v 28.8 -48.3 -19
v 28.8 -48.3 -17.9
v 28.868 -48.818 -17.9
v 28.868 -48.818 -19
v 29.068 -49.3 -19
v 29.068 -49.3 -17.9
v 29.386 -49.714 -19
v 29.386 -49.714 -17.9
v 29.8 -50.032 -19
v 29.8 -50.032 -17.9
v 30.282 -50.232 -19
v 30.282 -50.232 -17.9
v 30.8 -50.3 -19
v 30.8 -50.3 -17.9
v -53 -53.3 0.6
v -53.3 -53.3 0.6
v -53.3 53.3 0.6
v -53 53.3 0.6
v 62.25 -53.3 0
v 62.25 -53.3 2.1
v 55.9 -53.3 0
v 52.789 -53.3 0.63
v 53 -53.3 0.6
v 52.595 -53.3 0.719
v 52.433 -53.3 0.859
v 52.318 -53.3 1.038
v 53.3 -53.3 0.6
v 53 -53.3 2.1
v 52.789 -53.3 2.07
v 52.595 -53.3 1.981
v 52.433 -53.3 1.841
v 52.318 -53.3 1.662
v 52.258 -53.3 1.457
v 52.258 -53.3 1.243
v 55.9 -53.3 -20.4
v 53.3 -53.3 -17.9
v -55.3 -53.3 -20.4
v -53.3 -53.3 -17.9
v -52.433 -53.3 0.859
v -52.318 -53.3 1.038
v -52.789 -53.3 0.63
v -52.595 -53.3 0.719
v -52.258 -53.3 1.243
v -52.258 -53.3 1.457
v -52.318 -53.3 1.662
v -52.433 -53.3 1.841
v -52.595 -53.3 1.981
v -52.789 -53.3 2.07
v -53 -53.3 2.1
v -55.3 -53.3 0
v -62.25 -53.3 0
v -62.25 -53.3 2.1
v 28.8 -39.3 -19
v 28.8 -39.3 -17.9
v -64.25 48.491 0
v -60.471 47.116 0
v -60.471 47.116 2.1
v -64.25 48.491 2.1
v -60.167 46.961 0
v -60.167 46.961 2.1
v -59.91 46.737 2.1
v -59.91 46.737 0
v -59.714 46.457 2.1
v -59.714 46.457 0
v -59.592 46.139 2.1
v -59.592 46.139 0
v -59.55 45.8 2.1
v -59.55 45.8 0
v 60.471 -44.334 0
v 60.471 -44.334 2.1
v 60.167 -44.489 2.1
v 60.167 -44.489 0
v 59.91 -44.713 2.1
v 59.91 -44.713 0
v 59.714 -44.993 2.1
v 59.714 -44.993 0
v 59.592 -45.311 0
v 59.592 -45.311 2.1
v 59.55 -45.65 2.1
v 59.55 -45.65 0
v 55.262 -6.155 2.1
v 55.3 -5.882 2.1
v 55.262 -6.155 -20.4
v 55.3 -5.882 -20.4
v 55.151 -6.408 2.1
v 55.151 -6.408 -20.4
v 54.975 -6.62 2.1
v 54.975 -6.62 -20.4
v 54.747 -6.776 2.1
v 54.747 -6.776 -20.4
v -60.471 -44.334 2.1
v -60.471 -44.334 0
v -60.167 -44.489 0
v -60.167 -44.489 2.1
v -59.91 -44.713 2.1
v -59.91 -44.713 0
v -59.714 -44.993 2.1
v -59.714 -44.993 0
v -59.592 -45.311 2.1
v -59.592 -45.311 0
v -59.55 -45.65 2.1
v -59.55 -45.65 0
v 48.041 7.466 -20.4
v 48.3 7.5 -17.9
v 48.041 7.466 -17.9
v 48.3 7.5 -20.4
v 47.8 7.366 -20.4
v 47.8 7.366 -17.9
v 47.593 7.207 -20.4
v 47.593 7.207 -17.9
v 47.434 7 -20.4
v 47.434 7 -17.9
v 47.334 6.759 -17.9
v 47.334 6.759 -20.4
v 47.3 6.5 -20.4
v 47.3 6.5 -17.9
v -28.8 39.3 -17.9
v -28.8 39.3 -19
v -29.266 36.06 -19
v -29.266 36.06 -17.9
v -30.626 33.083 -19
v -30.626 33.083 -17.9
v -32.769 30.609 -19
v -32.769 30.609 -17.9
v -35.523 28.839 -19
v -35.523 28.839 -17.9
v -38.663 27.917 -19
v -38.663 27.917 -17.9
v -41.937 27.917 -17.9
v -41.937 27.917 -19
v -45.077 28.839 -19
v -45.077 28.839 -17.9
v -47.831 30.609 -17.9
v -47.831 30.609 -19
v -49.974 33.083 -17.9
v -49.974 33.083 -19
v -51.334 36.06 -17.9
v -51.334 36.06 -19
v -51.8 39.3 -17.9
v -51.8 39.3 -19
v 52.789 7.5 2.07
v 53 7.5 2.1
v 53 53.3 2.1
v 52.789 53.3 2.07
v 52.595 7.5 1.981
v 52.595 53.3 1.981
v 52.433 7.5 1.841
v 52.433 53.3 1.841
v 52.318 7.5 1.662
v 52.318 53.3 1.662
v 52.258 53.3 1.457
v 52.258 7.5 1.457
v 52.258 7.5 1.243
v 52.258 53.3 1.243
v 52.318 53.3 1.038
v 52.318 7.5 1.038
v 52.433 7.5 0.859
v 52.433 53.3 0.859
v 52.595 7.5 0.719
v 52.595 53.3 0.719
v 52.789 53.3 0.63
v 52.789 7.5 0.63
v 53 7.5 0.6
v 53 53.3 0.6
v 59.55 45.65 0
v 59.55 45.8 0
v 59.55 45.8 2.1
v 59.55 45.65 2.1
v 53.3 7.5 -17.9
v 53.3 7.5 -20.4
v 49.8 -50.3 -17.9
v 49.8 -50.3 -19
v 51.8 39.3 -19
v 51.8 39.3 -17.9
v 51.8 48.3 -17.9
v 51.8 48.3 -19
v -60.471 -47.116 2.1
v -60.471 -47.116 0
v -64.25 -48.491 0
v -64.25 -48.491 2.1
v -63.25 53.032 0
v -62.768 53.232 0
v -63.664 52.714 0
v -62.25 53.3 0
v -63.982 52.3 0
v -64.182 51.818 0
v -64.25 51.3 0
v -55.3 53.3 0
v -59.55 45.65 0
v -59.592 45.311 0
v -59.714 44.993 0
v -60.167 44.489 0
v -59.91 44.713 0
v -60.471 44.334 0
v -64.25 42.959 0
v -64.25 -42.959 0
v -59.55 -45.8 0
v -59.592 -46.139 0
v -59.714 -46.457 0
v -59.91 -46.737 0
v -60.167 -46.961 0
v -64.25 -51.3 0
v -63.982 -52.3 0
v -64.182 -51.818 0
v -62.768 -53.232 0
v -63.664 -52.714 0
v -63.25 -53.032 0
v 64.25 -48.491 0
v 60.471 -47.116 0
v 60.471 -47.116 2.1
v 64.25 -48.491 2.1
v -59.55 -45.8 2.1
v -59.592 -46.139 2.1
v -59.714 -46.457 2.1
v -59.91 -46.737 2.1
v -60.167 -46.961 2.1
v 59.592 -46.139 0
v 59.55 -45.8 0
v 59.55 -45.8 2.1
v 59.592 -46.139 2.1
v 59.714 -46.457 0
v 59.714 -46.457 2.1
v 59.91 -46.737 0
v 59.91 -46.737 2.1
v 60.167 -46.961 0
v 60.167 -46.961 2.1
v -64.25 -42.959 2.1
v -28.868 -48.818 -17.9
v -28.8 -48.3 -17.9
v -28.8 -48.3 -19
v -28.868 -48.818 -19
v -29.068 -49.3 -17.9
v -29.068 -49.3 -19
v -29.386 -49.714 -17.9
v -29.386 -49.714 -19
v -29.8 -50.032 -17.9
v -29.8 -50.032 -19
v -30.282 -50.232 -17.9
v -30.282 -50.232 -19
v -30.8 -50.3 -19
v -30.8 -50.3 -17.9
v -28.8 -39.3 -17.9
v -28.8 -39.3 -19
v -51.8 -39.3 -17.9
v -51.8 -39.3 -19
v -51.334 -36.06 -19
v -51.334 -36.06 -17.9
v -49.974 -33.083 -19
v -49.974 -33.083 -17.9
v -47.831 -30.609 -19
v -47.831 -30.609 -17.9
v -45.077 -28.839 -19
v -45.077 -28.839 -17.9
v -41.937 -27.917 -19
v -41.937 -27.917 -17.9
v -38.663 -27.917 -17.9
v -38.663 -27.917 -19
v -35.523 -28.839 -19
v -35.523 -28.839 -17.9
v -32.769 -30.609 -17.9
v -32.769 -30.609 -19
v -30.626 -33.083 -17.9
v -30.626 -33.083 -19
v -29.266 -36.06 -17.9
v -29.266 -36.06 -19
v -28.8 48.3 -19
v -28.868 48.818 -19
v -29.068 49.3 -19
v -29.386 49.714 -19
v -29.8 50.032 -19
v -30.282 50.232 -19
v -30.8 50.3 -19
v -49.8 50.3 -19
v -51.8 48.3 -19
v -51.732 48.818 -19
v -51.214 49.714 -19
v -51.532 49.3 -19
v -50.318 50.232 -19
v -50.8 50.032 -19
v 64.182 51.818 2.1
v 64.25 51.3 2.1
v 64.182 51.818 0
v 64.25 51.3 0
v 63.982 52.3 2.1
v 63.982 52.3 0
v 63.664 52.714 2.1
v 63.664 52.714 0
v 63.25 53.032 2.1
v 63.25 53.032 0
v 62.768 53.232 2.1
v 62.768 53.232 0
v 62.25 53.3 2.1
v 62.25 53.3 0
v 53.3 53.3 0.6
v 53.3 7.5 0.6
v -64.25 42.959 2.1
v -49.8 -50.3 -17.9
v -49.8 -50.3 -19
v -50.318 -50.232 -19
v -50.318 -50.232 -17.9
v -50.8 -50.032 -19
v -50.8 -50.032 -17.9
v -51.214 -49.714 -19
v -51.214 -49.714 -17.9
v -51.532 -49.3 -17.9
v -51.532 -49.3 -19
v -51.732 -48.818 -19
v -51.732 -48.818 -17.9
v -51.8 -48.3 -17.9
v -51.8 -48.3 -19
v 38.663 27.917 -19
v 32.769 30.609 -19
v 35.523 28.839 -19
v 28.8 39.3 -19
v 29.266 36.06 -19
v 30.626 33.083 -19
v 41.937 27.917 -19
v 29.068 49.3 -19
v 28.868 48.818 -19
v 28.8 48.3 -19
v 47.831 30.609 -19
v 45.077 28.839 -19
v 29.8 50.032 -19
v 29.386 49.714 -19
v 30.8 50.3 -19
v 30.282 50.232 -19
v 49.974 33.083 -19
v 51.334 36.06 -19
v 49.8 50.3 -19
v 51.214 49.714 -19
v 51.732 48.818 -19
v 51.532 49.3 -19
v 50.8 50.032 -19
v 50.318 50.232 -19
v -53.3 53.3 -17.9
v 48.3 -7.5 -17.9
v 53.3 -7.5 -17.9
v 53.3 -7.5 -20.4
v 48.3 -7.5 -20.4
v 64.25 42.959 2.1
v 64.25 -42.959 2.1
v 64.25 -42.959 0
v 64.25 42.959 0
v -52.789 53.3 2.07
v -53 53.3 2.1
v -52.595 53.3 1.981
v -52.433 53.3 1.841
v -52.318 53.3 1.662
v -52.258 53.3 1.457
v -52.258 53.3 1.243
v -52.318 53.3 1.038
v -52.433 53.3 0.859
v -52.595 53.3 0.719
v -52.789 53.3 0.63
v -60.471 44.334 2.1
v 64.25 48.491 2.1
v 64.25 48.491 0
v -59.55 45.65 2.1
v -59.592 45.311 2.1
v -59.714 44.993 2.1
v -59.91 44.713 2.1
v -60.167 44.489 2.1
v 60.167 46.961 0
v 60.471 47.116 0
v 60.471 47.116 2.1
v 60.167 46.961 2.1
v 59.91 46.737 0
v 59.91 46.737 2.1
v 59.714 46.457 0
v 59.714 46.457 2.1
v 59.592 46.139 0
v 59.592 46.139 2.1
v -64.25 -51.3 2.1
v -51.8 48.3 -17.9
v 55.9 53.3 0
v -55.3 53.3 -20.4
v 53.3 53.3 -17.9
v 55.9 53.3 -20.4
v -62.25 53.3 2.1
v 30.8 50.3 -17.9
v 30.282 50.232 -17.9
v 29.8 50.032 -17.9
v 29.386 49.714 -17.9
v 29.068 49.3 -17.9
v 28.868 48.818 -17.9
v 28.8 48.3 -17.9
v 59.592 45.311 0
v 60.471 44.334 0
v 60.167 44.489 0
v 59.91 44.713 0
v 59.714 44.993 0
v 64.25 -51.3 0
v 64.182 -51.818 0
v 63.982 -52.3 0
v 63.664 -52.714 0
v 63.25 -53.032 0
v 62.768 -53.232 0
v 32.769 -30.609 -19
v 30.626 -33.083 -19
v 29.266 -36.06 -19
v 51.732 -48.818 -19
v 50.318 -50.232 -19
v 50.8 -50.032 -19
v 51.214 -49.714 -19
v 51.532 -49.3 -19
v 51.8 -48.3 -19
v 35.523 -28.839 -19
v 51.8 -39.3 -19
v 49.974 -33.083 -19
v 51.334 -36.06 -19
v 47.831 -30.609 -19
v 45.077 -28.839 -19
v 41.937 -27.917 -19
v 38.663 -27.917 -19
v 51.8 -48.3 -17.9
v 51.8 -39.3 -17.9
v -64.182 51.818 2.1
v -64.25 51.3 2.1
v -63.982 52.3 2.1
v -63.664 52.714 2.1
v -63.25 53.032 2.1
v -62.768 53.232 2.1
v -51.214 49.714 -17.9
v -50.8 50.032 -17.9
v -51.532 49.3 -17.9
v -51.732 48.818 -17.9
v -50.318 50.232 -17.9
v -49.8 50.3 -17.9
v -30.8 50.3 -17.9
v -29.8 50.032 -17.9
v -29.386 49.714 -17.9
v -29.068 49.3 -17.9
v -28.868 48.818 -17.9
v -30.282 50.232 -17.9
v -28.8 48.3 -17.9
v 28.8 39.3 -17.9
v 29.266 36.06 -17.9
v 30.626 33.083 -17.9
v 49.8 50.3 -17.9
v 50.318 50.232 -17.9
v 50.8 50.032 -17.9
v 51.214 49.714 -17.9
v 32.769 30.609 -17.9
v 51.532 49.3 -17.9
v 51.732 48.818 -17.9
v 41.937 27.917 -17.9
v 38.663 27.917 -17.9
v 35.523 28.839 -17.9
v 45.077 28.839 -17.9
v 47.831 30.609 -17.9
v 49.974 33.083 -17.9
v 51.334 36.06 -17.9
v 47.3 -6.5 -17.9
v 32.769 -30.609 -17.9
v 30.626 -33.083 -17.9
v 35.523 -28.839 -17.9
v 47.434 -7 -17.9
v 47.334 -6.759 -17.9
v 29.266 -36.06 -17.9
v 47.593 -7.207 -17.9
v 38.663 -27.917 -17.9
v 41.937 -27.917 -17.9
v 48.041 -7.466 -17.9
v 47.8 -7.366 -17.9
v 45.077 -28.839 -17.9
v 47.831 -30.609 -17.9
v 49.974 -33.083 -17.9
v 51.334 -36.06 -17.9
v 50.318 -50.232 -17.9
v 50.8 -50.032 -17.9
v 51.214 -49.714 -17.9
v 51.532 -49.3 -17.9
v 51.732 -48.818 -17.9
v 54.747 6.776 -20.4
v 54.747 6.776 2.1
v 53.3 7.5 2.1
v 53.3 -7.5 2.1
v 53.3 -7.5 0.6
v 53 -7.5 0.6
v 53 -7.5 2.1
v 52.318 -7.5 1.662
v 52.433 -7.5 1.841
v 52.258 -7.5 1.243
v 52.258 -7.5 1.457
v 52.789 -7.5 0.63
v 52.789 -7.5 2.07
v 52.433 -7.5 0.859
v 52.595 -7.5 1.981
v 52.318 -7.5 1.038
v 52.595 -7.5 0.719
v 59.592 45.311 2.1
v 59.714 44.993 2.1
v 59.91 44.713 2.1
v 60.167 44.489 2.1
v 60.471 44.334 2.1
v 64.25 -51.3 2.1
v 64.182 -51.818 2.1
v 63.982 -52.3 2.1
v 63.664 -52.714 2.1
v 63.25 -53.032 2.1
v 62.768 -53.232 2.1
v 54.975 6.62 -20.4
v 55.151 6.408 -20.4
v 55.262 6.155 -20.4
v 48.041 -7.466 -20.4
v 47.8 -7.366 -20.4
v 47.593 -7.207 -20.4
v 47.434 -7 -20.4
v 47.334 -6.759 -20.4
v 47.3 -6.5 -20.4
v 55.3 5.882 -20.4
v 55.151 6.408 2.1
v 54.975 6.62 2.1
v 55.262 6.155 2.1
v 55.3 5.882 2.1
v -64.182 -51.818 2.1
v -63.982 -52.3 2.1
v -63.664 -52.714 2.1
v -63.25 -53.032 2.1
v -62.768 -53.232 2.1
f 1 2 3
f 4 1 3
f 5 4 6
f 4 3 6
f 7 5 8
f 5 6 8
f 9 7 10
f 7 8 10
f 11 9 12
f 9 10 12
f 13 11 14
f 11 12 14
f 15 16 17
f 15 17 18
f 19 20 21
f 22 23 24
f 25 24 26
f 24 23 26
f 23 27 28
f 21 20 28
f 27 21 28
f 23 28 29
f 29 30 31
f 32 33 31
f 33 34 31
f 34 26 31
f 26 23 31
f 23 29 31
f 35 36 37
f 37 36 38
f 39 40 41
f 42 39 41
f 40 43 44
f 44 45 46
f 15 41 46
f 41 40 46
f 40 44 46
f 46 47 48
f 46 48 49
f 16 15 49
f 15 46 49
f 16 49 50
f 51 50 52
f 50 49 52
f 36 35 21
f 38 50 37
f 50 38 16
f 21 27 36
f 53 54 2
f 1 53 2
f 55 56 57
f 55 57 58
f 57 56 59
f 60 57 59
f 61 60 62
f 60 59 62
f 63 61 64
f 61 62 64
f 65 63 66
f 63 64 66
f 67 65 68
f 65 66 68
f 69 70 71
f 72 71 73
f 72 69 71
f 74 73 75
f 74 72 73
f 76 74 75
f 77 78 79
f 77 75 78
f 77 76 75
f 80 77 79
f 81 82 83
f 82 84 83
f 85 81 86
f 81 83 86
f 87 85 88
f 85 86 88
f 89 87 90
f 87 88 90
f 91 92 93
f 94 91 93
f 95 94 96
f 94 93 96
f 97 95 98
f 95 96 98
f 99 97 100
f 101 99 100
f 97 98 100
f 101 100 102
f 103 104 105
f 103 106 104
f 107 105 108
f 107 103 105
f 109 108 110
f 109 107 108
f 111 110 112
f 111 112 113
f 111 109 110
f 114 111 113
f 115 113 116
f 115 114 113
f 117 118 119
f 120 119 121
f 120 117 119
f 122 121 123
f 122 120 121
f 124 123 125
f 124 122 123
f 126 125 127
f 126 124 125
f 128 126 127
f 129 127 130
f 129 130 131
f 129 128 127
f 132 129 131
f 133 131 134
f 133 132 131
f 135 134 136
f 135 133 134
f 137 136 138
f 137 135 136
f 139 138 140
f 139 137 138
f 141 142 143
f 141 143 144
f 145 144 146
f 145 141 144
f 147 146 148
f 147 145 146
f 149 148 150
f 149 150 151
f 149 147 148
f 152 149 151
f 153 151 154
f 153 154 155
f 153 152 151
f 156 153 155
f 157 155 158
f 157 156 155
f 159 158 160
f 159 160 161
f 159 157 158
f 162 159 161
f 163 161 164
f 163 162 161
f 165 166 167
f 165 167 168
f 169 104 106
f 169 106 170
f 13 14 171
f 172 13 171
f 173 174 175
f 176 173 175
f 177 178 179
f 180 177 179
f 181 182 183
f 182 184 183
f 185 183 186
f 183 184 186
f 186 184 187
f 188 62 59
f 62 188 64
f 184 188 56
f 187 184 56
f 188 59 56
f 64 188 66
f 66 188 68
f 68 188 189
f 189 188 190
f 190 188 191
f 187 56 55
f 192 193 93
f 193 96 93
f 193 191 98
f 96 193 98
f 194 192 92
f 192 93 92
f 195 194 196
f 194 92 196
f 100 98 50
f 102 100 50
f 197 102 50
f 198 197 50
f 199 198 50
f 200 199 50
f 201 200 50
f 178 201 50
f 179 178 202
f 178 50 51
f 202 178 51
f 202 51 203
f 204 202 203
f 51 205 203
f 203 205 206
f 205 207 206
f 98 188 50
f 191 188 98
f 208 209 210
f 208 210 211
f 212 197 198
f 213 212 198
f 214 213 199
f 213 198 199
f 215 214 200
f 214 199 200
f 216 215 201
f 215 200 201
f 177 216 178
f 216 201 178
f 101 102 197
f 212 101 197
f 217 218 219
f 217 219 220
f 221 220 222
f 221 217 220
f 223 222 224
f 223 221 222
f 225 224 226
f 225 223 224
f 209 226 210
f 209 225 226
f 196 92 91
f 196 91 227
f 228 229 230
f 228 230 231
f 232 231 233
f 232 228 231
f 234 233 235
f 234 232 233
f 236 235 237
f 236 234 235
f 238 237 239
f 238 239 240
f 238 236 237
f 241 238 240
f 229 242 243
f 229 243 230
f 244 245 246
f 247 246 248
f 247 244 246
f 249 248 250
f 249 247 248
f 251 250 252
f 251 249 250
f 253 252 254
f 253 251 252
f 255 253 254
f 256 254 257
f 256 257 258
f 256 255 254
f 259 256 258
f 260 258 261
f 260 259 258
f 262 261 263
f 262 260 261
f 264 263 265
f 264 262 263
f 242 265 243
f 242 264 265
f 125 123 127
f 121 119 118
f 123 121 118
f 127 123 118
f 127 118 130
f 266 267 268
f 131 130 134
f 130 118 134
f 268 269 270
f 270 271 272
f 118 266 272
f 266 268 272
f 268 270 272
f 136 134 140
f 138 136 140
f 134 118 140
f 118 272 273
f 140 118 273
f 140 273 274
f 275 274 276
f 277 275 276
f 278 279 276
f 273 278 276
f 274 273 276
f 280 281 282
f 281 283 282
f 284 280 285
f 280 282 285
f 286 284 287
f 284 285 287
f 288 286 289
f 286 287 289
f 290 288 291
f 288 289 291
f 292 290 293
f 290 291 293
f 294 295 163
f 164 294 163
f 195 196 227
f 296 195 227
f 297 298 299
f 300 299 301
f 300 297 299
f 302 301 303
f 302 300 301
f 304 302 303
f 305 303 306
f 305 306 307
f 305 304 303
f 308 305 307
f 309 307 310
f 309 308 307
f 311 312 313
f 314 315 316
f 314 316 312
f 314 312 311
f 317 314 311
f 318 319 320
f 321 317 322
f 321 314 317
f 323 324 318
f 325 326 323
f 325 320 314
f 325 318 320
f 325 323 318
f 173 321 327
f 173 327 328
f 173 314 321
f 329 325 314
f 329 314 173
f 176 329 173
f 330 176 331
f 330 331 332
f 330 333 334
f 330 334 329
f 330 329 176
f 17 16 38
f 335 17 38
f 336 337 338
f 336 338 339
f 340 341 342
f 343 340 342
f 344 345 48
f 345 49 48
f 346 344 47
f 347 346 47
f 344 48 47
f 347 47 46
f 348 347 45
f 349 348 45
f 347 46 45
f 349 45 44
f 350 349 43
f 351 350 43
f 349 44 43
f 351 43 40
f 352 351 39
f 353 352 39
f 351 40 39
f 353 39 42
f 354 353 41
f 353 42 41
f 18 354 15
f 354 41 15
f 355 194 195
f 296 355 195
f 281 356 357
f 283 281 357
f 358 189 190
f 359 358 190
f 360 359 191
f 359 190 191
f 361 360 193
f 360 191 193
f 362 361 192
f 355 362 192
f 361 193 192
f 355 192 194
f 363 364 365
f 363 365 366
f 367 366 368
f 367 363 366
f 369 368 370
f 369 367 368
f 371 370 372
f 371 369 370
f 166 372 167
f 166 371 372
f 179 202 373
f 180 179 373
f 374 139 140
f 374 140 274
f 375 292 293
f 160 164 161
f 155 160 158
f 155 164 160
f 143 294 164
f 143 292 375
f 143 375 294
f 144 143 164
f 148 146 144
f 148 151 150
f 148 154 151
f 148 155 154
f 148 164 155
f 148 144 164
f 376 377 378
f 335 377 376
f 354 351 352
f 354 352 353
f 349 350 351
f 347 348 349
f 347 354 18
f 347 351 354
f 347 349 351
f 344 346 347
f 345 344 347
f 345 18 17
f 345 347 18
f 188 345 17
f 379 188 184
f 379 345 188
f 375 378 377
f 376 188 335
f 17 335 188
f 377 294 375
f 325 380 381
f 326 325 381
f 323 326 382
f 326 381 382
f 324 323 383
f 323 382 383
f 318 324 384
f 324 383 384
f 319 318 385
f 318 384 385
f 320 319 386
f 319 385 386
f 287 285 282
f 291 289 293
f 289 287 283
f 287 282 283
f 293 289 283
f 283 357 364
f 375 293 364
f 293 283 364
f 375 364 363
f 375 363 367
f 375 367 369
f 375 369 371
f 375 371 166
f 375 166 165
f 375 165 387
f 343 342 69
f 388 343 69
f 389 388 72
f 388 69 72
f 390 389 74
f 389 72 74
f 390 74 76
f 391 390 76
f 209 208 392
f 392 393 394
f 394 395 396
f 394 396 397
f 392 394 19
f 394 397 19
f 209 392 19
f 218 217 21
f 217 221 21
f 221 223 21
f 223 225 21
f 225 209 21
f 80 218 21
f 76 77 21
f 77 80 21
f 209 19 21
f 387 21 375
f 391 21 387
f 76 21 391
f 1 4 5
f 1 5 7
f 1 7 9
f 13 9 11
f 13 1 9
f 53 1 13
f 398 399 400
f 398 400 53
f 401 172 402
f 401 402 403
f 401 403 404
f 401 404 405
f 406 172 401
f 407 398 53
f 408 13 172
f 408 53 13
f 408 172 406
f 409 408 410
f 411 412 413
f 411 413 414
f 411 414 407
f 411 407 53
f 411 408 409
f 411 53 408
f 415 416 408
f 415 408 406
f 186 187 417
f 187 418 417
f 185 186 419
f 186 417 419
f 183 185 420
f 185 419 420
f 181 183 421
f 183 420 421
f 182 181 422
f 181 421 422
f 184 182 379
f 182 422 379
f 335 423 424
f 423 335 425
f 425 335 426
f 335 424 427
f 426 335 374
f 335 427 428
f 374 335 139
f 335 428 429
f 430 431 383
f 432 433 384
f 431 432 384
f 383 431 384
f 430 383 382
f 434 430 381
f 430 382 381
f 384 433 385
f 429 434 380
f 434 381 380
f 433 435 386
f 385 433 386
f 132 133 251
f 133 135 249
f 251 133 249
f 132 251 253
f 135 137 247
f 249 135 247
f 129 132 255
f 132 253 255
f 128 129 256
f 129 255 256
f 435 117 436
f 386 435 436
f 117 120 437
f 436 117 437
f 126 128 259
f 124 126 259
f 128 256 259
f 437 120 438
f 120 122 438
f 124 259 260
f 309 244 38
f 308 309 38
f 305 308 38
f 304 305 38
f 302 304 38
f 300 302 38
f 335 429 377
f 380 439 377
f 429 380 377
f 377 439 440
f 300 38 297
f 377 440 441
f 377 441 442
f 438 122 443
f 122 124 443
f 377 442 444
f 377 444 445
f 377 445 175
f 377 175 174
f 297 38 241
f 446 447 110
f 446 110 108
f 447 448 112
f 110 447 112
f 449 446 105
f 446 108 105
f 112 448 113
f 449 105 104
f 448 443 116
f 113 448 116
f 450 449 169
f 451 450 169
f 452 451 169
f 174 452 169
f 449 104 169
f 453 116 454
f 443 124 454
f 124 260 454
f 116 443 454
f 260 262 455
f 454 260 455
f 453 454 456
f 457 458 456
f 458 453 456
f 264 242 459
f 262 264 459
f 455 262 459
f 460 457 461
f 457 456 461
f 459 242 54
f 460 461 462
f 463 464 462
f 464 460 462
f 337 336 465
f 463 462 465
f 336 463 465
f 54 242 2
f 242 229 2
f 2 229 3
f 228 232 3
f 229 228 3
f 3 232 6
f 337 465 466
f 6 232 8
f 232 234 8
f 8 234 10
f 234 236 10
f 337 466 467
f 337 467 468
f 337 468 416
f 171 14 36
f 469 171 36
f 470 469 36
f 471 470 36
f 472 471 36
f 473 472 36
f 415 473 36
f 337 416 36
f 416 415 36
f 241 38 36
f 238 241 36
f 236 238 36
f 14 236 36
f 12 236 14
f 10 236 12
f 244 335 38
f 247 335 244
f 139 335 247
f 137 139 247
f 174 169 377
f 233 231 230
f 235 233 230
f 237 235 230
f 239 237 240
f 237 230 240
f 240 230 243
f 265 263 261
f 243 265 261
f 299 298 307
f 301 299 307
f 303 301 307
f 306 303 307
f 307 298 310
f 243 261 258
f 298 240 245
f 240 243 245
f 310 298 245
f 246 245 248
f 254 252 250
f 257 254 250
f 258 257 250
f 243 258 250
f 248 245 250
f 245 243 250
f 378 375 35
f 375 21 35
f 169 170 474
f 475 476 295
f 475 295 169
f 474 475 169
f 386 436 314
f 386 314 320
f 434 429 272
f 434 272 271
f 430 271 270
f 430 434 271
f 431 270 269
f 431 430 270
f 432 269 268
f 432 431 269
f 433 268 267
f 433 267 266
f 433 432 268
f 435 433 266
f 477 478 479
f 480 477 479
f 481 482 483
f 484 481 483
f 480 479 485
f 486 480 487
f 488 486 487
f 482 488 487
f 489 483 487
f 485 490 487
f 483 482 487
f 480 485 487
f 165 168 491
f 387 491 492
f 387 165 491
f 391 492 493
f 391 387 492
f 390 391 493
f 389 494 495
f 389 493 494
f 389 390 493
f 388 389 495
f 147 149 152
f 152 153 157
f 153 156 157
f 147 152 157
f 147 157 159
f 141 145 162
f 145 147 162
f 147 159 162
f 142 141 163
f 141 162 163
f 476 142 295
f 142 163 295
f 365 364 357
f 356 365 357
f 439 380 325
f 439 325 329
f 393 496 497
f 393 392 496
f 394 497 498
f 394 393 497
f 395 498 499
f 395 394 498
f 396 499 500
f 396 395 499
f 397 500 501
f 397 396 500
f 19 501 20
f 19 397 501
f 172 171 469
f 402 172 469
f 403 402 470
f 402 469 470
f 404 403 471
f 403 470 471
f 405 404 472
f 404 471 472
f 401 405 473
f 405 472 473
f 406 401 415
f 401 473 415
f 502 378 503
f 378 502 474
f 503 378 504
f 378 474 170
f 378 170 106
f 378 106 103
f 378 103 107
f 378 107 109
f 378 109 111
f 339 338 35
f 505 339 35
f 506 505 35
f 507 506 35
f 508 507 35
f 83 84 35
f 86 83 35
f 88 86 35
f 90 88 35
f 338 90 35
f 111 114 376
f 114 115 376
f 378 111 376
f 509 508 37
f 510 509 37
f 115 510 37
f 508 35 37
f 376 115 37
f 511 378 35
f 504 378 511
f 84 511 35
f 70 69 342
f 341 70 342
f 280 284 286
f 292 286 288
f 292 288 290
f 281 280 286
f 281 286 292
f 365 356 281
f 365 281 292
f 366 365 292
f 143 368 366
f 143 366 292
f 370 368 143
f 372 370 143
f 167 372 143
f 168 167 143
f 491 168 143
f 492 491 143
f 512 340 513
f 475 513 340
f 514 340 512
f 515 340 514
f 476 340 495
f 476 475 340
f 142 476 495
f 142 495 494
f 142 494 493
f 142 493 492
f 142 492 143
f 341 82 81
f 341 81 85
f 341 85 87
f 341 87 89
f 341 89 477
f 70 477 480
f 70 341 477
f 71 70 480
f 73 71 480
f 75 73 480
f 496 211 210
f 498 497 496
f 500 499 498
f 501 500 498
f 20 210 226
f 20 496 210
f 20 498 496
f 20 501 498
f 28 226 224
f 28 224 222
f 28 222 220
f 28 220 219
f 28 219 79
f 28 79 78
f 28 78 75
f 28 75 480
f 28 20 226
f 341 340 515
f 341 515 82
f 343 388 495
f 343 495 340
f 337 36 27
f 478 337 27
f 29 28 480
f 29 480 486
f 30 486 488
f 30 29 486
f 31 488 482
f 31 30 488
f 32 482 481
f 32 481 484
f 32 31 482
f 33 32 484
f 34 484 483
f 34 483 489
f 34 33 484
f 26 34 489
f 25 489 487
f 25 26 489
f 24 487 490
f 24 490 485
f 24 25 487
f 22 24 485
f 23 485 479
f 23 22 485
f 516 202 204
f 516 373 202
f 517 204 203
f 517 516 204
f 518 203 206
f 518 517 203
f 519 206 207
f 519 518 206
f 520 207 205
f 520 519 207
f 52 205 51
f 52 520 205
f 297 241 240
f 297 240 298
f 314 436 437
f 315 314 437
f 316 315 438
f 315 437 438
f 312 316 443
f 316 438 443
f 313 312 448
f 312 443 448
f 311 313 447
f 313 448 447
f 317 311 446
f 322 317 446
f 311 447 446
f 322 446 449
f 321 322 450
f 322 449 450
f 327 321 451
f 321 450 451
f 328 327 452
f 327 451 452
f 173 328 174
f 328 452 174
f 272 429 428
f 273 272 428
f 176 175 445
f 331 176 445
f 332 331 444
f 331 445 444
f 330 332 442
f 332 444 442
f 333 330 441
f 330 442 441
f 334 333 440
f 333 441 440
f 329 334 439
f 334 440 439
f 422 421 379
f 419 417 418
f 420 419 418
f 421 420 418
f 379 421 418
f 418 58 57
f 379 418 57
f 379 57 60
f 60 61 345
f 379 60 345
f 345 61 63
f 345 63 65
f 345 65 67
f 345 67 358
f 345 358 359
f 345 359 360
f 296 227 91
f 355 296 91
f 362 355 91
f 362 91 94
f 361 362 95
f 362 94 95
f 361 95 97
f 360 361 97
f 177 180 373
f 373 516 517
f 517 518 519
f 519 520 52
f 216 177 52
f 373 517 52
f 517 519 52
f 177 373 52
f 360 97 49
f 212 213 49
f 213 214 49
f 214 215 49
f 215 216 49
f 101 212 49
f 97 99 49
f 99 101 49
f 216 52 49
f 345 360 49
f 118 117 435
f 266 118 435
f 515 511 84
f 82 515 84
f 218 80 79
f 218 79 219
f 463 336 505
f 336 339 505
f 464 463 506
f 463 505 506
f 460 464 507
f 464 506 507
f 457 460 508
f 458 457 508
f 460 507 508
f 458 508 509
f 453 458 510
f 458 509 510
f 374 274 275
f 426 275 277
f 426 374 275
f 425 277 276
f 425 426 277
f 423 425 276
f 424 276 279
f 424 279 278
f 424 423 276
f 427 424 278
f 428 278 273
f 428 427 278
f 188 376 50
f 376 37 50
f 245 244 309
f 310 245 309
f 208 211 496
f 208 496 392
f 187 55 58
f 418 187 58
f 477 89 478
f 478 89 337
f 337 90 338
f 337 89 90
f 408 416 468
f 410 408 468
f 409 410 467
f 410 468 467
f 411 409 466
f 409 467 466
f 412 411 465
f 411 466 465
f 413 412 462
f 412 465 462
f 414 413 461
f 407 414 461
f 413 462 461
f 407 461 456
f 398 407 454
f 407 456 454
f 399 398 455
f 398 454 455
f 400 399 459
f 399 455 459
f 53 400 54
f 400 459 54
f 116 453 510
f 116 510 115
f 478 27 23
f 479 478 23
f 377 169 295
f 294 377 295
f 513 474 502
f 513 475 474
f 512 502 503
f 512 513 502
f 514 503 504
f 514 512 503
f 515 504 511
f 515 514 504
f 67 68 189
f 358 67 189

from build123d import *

# Parameters (mm, degrees)
PAD001_DEPTH         = 53.3
PAD002_DEPTH         = 53.3
POCKET_DEPTH         = 19
POCKET001_DEPTH      = 5
POCKET004_DEPTH      = 20.401
POCKET004_DEPTH_BACK = -2.101
FILLET_R             = 2
FILLET001_R          = 1


with BuildPart() as part:
    # Sketch001 → Pad001 (new body, symmetric)
    with BuildSketch(Plane.XZ):
        Polygon((64.25, 0), (55.9, 0), (55.9, -20.4), (-55.3, -20.4), (-55.3, 0), (-64.25, 0), (-64.25, 2.1), (-53.3, 2.1), (-53.3, -17.9), (53.3, -17.9), (53.3, 2.1), (64.25, 2.1), align=None)
    extrude(amount=PAD001_DEPTH, both=True)

    # Sketch002 → Pad002 (join, symmetric)
    with BuildSketch(Plane.XZ):
        with BuildLine():
            ThreePointArc((53, 2.1), (52.25, 1.35), (53, 0.6))
            Line((53.3, 0.6), (53, 0.6))
            Line((53.3, 2.1), (53.3, 0.6))
            Line((53.3, 2.1), (53, 2.1))
        make_face()
    pad002 = extrude(amount=PAD002_DEPTH, both=True)

    # Sketch003 → Pocket (cut)
    with BuildSketch(Plane.XY):
        with BuildLine():
            ThreePointArc((28.8, 39.3), (40.3, 27.8), (51.8, 39.3))
            Line((51.8, 39.3), (51.8, 48.3))
            ThreePointArc((51.8, 48.3), (51.214214, 49.714214), (49.8, 50.3))
            Line((30.8, 50.3), (49.8, 50.3))
            ThreePointArc((30.8, 50.3), (29.385786, 49.714214), (28.8, 48.3))
            Line((28.8, 39.3), (28.8, 48.3))
        make_face()
        with BuildLine():
            ThreePointArc((51.8, -39.3), (40.3, -27.8), (28.8, -39.3))
            Line((28.8, -39.3), (28.8, -48.3))
            ThreePointArc((28.8, -48.3), (29.385786, -49.714214), (30.8, -50.3))
            Line((30.8, -50.3), (49.8, -50.3))
            ThreePointArc((49.8, -50.3), (51.214214, -49.714214), (51.8, -48.3))
            Line((51.8, -39.3), (51.8, -48.3))
        make_face()
    pocket = extrude(amount=-POCKET_DEPTH, mode=Mode.SUBTRACT)

    # Mirrored: Pad002, Pocket across Sketch002 V_Axis
    add(pad002.mirror(Plane(origin=(0, 0, 0), x_dir=(0, -1, 0), z_dir=(1, 0, 0))))
    add(pocket.mirror(Plane(origin=(0, 0, 0), x_dir=(0, -1, 0), z_dir=(1, 0, 0))), mode=Mode.SUBTRACT)

    # Sketch004 → Pocket001 (cut)
    with BuildSketch(Plane.XY):
        with BuildLine():
            ThreePointArc((59.55, -45.8), (59.803187, -46.603007), (60.471172, -47.11557))
            Line((60.471172, -47.11557), (64.25, -48.490951))
            Line((64.25, -42.959049), (64.25, -48.490951))
            Line((60.471172, -44.33443), (64.25, -42.959049))
            ThreePointArc((60.471172, -44.33443), (59.803187, -44.846993), (59.55, -45.65))
            Line((59.55, -45.65), (59.55, -45.8))
        make_face()
        with BuildLine():
            ThreePointArc((60.471172, 47.11557), (59.803187, 46.603007), (59.55, 45.8))
            Line((59.55, 45.8), (59.55, 45.65))
            ThreePointArc((59.55, 45.65), (59.803187, 44.846993), (60.471172, 44.33443))
            Line((60.471172, 44.33443), (64.25, 42.959049))
            Line((64.25, 48.490951), (64.25, 42.959049))
            Line((60.471172, 47.11557), (64.25, 48.490951))
        make_face()
    pocket001 = extrude(amount=POCKET001_DEPTH, mode=Mode.SUBTRACT)

    # Mirrored001: Pocket001 across YZ
    add(pocket001.mirror(Plane.YZ), mode=Mode.SUBTRACT)

    # Sketch005 → Pocket004 (cut, two sides)
    with BuildSketch(Plane.XY) as pocket004_sk:
        Polygon((47.3, -7.5), (47.3, 7.5), (53.3, 7.5), (55.3, 6.5), (55.3, -6.5), (53.3, -7.5), align=None)
    extrude(amount=-POCKET004_DEPTH, mode=Mode.SUBTRACT)
    extrude(pocket004_sk.sketch, amount=-POCKET004_DEPTH_BACK, mode=Mode.SUBTRACT)

    # Fillet
    fillet_edges = [part.edges().sort_by_distance(p)[0] for p in [
        (64.25, -53.3, 1.05),
        (64.25, 53.3, 1.05),
        (-64.25, 53.3, 1.05),
        (-64.25, -53.3, 1.05),
    ]]
    fillet(fillet_edges, radius=FILLET_R)

    # Fillet001
    fillet001_edges = [part.edges().sort_by_distance(p)[0] for p in [
        (55.3, 6.5, -9.15),
        (47.3, 7.5, -19.15),
        (47.3, -7.5, -19.15),
        (55.3, -6.5, -9.15),
    ]]
    fillet(fillet001_edges, radius=FILLET001_R)


solid = part.part
